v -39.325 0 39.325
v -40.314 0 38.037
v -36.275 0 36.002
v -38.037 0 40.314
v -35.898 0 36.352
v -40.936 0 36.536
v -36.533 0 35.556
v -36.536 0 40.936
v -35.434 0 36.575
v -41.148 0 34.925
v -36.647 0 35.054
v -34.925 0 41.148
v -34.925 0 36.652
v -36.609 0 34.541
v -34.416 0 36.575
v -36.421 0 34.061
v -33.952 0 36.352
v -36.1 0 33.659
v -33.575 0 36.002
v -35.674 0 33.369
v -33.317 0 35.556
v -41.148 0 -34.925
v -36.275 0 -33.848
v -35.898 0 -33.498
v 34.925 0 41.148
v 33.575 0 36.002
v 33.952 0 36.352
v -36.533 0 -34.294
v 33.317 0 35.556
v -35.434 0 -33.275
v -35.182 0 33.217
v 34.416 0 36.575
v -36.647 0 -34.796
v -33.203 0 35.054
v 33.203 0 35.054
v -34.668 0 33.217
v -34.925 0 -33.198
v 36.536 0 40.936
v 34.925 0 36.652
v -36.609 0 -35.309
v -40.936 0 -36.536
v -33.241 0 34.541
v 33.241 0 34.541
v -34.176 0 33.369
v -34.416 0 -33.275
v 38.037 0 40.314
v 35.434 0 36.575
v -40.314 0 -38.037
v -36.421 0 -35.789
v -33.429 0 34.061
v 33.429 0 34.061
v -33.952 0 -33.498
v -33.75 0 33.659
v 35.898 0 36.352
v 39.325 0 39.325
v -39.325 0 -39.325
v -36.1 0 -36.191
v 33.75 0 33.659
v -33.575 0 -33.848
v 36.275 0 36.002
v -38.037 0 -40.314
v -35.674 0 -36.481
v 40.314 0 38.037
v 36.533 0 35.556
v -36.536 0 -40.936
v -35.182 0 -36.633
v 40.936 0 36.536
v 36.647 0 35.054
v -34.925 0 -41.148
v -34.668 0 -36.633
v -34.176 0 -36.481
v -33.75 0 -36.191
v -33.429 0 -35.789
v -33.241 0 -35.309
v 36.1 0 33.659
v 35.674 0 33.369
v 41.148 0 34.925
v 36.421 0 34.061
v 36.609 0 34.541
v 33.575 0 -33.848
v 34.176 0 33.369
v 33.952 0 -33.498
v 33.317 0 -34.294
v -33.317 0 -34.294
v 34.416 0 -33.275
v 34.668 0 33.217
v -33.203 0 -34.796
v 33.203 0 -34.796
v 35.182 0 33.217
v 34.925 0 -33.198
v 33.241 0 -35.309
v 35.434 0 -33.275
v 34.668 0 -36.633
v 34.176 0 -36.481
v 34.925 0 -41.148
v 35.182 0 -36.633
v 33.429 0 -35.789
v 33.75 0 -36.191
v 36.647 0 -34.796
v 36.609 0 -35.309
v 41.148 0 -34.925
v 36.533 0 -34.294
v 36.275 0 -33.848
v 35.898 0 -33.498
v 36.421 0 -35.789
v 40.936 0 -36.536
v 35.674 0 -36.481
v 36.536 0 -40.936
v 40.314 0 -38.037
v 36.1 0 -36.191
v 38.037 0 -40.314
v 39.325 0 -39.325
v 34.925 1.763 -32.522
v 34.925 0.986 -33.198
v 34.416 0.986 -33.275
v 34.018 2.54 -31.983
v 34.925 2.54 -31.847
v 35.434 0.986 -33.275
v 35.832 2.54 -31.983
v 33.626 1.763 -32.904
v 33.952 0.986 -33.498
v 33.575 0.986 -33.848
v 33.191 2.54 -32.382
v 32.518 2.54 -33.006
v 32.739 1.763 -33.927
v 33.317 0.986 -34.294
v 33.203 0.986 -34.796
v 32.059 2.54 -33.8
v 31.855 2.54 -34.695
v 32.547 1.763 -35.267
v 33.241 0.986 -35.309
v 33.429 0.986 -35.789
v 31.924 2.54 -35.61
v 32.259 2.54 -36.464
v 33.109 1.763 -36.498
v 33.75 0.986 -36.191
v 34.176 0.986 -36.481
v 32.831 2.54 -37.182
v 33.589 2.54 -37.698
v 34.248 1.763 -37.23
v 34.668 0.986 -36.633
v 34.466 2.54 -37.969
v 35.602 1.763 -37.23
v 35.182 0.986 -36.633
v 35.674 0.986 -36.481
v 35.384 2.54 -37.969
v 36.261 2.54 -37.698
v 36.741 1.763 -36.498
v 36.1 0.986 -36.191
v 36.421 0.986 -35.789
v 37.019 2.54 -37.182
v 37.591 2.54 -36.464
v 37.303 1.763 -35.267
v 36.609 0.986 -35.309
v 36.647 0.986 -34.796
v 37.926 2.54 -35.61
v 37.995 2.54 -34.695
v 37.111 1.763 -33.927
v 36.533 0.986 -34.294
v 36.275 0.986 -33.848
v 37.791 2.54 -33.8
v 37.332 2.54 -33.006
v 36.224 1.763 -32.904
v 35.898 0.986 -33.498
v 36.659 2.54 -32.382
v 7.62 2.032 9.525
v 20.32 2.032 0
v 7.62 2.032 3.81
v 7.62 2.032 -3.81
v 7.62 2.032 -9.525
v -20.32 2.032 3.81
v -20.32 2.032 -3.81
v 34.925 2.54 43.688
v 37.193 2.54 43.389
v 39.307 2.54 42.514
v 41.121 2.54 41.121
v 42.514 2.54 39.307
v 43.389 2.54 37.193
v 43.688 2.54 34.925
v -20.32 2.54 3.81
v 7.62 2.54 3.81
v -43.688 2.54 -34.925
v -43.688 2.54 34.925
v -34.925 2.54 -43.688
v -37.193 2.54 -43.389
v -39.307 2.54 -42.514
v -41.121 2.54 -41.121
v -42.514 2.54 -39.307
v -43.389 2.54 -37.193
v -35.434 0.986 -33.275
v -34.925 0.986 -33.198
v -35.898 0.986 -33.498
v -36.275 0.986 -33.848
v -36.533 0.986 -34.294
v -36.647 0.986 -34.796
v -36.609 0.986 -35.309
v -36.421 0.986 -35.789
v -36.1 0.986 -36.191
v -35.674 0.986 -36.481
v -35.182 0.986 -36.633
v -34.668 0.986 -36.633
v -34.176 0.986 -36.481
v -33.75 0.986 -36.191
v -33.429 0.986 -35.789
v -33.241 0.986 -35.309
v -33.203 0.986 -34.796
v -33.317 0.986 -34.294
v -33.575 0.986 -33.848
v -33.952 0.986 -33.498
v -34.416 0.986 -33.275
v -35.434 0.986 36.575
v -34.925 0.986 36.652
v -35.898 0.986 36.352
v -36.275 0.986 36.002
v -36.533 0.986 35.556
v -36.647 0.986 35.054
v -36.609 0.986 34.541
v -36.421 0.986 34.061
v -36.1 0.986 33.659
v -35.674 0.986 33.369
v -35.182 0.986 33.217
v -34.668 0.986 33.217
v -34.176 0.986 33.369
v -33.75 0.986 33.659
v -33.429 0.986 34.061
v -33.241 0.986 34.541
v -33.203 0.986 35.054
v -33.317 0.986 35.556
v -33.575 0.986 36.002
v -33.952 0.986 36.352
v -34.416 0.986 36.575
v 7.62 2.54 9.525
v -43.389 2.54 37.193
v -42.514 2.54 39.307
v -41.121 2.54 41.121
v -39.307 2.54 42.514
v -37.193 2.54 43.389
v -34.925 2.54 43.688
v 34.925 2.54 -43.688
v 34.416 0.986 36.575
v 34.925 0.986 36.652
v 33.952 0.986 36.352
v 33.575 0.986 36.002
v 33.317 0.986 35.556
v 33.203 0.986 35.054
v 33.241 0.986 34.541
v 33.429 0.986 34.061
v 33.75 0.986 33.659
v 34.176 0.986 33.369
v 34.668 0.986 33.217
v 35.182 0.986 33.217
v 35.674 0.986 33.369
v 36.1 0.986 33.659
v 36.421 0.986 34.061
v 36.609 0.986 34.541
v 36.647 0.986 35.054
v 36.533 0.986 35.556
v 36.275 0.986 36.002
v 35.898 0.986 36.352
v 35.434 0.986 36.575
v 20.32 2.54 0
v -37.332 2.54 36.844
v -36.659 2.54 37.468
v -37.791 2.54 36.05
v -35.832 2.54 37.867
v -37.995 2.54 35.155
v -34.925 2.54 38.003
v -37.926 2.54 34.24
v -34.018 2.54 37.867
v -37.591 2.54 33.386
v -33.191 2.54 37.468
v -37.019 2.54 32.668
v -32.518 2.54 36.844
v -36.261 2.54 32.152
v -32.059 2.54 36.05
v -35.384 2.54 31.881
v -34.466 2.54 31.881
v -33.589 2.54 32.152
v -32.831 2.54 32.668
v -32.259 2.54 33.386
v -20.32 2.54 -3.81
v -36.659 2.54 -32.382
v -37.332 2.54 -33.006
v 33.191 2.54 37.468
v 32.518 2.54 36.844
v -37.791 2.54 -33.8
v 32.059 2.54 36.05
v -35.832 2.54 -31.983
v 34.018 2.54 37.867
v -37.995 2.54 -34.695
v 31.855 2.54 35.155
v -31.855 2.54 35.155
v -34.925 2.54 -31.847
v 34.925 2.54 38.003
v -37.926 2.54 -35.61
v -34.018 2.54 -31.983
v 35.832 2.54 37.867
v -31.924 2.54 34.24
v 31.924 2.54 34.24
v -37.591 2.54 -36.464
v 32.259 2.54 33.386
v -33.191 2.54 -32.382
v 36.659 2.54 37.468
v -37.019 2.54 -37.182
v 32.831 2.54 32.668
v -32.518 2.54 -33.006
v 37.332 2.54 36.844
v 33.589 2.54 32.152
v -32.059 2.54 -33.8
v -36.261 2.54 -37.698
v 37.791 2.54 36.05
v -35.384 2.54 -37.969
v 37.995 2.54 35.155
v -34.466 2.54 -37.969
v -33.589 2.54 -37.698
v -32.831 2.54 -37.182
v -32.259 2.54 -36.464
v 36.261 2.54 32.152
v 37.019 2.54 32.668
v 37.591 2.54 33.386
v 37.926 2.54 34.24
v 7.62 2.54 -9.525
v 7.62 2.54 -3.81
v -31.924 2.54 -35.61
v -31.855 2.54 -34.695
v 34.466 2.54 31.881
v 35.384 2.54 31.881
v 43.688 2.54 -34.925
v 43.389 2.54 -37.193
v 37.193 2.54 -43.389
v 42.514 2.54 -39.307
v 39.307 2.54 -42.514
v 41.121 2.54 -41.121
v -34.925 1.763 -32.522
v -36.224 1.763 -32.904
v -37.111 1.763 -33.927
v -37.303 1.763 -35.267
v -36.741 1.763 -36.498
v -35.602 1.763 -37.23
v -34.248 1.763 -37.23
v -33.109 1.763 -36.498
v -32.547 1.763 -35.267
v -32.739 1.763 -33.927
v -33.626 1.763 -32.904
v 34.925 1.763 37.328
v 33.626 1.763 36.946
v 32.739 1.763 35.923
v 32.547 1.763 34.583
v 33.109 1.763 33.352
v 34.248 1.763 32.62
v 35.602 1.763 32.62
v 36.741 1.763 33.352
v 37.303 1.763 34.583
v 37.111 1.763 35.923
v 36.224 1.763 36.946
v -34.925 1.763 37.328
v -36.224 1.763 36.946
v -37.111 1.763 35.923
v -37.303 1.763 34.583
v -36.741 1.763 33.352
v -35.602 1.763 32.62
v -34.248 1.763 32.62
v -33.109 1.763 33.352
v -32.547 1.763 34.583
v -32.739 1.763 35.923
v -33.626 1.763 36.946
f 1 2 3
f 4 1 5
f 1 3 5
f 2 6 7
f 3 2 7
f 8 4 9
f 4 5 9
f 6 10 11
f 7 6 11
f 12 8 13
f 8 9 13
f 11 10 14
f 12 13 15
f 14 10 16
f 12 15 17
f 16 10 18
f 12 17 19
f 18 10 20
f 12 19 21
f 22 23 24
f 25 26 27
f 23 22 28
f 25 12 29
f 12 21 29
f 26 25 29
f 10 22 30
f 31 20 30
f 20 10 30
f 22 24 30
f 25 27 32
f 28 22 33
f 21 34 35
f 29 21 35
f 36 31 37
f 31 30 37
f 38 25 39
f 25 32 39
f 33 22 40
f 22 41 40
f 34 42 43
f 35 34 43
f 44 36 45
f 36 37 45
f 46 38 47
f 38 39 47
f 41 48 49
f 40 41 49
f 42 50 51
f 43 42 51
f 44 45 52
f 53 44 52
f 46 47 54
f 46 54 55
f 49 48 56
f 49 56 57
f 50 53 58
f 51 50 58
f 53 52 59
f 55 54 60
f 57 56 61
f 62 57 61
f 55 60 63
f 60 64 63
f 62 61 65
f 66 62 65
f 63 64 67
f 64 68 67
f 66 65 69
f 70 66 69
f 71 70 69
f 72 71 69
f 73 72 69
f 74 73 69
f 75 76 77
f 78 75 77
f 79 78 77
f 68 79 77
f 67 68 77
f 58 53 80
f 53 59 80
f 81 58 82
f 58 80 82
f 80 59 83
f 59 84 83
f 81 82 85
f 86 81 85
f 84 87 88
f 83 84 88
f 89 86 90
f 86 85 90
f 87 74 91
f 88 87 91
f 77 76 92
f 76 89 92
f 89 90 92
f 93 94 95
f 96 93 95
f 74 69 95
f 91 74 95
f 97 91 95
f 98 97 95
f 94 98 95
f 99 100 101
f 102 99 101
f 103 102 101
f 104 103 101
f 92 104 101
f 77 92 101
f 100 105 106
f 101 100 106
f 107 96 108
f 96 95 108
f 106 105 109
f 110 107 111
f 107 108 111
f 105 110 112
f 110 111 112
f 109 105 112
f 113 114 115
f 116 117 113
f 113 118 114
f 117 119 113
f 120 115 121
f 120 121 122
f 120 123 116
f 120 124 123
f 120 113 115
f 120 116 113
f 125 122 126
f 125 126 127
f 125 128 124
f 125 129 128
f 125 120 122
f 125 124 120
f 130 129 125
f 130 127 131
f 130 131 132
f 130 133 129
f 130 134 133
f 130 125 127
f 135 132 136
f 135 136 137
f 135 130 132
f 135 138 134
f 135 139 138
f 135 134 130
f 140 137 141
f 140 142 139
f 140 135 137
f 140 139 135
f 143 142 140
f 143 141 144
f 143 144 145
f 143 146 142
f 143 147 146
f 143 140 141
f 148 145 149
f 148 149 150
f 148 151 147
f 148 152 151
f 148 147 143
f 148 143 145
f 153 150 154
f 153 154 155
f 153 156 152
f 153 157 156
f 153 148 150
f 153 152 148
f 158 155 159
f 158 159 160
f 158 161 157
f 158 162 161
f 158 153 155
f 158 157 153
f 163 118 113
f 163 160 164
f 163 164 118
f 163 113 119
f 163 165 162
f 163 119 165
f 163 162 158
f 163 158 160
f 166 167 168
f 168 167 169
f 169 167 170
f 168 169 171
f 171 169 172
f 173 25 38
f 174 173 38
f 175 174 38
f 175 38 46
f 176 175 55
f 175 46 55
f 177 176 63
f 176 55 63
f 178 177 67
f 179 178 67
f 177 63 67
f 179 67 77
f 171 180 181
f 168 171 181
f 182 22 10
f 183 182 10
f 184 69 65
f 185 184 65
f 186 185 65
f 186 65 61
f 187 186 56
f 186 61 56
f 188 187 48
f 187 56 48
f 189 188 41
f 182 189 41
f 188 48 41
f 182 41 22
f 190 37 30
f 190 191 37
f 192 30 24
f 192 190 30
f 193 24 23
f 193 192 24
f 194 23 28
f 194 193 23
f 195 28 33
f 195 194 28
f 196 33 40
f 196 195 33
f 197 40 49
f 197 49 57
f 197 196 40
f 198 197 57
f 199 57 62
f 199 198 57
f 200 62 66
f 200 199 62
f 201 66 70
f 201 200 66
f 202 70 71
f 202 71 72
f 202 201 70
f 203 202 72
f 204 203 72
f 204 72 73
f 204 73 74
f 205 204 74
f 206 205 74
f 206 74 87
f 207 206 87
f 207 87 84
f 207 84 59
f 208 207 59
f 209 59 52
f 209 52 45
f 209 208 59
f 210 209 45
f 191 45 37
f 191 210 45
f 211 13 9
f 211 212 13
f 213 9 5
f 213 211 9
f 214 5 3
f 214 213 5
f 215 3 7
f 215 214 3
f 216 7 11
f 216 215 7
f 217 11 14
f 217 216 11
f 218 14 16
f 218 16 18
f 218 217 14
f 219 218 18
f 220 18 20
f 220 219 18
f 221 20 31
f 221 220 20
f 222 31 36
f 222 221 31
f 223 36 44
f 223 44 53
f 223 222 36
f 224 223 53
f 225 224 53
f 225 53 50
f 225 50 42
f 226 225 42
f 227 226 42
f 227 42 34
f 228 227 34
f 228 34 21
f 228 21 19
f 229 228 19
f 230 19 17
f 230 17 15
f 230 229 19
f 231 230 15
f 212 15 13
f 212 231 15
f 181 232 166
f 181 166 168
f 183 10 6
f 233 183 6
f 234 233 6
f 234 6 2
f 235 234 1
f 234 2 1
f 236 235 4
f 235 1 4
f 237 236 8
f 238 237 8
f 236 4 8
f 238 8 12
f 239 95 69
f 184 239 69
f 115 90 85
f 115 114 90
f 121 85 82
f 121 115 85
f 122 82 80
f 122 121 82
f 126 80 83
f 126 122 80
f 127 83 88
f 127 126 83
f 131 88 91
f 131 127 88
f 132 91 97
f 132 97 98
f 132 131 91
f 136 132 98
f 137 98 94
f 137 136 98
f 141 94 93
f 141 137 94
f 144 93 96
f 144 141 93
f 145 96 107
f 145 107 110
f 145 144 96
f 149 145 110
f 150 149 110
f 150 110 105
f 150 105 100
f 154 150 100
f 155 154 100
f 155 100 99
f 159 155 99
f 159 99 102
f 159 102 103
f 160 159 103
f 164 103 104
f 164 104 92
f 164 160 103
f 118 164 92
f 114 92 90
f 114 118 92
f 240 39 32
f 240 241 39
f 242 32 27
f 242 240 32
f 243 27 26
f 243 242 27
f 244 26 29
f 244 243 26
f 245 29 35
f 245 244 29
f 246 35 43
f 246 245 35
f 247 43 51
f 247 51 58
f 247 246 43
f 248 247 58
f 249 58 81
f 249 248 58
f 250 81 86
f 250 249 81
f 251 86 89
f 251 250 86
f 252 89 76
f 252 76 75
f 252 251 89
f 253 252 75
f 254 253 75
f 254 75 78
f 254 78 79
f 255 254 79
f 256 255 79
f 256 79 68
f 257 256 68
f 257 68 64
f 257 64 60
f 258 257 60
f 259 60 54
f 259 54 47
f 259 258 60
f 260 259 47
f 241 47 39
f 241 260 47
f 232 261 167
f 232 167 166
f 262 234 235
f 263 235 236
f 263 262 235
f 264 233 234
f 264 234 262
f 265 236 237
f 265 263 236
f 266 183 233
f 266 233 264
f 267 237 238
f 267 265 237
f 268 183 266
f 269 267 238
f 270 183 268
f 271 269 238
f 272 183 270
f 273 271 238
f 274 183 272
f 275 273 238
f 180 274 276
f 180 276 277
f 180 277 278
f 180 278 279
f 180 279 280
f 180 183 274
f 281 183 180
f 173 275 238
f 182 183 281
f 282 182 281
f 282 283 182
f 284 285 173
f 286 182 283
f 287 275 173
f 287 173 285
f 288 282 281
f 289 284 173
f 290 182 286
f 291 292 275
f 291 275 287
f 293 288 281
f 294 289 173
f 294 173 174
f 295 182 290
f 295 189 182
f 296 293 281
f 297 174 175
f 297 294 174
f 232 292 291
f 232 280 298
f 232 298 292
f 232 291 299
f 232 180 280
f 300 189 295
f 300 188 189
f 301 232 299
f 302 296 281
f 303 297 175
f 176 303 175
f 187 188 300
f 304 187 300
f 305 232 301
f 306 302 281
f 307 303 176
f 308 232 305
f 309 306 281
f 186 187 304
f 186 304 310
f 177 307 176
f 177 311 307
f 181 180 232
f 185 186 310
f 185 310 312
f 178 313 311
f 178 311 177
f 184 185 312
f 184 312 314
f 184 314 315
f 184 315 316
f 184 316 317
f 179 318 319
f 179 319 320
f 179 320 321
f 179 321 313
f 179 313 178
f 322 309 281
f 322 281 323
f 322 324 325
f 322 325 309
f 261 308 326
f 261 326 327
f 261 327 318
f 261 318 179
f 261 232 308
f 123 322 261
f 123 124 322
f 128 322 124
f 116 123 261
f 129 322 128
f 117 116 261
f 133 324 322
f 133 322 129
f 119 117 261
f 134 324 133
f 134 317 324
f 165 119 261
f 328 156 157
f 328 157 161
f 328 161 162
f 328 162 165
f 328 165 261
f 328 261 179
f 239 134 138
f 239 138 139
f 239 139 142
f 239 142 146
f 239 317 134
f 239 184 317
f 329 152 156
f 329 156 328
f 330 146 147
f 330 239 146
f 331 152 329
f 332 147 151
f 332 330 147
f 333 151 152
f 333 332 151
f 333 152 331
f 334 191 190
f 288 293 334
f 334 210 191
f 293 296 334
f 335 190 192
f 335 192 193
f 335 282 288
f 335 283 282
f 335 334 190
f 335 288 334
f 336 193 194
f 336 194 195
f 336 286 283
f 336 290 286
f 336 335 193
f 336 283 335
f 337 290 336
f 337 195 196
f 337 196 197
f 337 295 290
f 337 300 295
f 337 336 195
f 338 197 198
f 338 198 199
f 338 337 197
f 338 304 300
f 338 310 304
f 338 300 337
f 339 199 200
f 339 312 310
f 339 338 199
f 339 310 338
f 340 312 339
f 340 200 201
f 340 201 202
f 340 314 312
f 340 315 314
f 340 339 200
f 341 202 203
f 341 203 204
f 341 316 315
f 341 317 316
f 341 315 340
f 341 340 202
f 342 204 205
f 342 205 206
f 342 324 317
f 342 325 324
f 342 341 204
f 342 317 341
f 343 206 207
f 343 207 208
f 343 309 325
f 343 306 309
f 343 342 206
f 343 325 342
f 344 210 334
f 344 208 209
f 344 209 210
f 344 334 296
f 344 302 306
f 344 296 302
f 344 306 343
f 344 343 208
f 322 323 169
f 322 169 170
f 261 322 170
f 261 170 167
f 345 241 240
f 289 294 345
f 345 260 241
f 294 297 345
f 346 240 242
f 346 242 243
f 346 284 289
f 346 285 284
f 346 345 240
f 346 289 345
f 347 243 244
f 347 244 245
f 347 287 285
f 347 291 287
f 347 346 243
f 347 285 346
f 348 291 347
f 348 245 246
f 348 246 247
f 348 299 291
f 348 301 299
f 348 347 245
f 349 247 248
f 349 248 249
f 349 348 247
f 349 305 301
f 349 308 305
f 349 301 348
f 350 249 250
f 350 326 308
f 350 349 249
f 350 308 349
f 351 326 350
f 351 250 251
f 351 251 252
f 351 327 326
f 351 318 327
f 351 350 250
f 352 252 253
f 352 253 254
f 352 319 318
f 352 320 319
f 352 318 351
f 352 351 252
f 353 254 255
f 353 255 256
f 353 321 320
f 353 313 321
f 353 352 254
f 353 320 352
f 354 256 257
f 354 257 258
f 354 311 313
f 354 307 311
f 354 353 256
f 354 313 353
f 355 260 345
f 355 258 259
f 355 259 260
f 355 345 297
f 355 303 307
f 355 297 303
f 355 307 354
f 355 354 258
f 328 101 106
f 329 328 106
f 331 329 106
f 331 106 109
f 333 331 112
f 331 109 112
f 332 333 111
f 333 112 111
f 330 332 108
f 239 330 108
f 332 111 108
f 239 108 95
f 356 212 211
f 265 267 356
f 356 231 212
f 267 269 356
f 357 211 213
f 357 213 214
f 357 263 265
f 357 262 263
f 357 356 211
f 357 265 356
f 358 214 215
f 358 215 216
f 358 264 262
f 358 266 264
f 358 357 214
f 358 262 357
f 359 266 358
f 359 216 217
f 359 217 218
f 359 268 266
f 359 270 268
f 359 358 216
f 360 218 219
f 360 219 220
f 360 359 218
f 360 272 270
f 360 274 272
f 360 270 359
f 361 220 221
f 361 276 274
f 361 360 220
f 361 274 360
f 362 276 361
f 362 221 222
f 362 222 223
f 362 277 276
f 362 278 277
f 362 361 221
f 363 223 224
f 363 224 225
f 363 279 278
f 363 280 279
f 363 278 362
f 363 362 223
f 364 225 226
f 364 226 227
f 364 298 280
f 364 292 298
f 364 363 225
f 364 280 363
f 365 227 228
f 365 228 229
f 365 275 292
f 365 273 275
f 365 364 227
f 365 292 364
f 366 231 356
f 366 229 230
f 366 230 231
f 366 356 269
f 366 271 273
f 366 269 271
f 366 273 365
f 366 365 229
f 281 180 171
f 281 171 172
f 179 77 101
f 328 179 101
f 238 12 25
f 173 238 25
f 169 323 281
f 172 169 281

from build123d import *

# Parameters (mm, degrees)
BOSS_EXTRUDE1_DEPTH                           = 2.54
CHAMFER1_SIZE                                 = 2.54
CSK_FOR_4_FLAT_HEAD_MACHINE_SCREW1_AT_2_COUNT = 2
CSK_FOR_4_FLAT_HEAD_MACHINE_SCREW1_AT_2_PITCH = 69.85
CSK_FOR_4_FLAT_HEAD_MACHINE_SCREW1_AT_3_COUNT = 2
CSK_FOR_4_FLAT_HEAD_MACHINE_SCREW1_AT_3_PITCH = 69.85
CSK_FOR_4_FLAT_HEAD_MACHINE_SCREW1_AT_4_COUNT = 2
CSK_FOR_4_FLAT_HEAD_MACHINE_SCREW1_AT_4_PITCH = 98.782817332
CUT_EXTRUDE2_DEPTH                            = 0.508


with BuildPart() as part:
    # Sketch1 → Boss-Extrude1 (new body)
    with BuildSketch(Plane(origin=(0, 0, 0), x_dir=(1, 0, 0), z_dir=(0, 1, 0))):
        with BuildLine():
            Line((-43.688, 34.925), (-43.688, -34.925))
            ThreePointArc((-43.688, -34.925), (-41.121376724, -41.121376724), (-34.925, -43.688))
            Line((-34.925, -43.688), (34.925, -43.688))
            ThreePointArc((34.925, -43.688), (41.121376724, -41.121376724), (43.688, -34.925))
            Line((43.688, -34.925), (43.688, 34.925))
            ThreePointArc((43.688, 34.925), (41.121376724, 41.121376724), (34.925, 43.688))
            Line((34.925, 43.688), (-34.925, 43.688))
            ThreePointArc((-34.925, 43.688), (-41.121376724, 41.121376724), (-43.688, 34.925))
        make_face()
    extrude(amount=BOSS_EXTRUDE1_DEPTH)

    # Chamfer1
    chamfer1_edges = [part.edges().sort_by_distance(p)[0] for p in [
        (-43.688, 0, 0),
        (-41.121376724, 0, 41.121376724),
        (-41.121376724, 0, -41.121376724),
        (0, 0, 43.688),
        (0, 0, -43.688),
        (41.121376724, 0, 41.121376724),
        (41.121376724, 0, -41.121376724),
        (43.688, 0, 0),
    ]]
    chamfer(chamfer1_edges, length=CHAMFER1_SIZE - 0.0001)  # a hair under: the kernel refuses the full size

    # Sketch6 → CSK for #4 Flat Head Machine Screw1 (revolve, cut)
    with BuildSketch(Plane(origin=(-34.925, 2.54, -34.925), x_dir=(0, 0, 1), z_dir=(1, 0, 0))):
        Polygon((0, 0), (0, 2.54), (1.7272, 2.54), (1.7272, 1.554265286), (3.0783022, 0), align=None)
    csk_for_4_flat_head_machine_screw1 = revolve(axis=Axis((-34.925, 8.89, -34.925), (0, -1, 0)), mode=Mode.SUBTRACT)

    # CSK for #4 Flat Head Machine Screw1 at 2: CSK for #4 Flat Head Machine Screw1 ×2
    with Locations(*[(i * CSK_FOR_4_FLAT_HEAD_MACHINE_SCREW1_AT_2_PITCH, 0, 0) for i in range(1, CSK_FOR_4_FLAT_HEAD_MACHINE_SCREW1_AT_2_COUNT)]):
        add(csk_for_4_flat_head_machine_screw1, mode=Mode.SUBTRACT)

    # CSK for #4 Flat Head Machine Screw1 at 3: CSK for #4 Flat Head Machine Screw1 ×2
    with Locations(*[(0, 0, i * CSK_FOR_4_FLAT_HEAD_MACHINE_SCREW1_AT_3_PITCH) for i in range(1, CSK_FOR_4_FLAT_HEAD_MACHINE_SCREW1_AT_3_COUNT)]):
        add(csk_for_4_flat_head_machine_screw1, mode=Mode.SUBTRACT)

    # CSK for #4 Flat Head Machine Screw1 at 4: CSK for #4 Flat Head Machine Screw1 ×2
    with Locations(*[Vector(0.7071067811865477, 0, 0.7071067811865475) * (i * CSK_FOR_4_FLAT_HEAD_MACHINE_SCREW1_AT_4_PITCH) for i in range(1, CSK_FOR_4_FLAT_HEAD_MACHINE_SCREW1_AT_4_COUNT)]):
        add(csk_for_4_flat_head_machine_screw1, mode=Mode.SUBTRACT)

    # Sketch3 → Cut-Extrude2 (cut)
    with BuildSketch(Plane(origin=(0, 2.54, 0), x_dir=(1, 0, 0), z_dir=(0, 1, 0))):
        Polygon((0, 3.81), (7.62, 3.81), (7.62, 9.525), (20.32, 0), (7.62, -9.525), (7.62, -3.81), (0, -3.81), (-20.32, -3.81), (-20.32, 3.81), align=None)
    extrude(amount=-CUT_EXTRUDE2_DEPTH, mode=Mode.SUBTRACT)


solid = part.part
